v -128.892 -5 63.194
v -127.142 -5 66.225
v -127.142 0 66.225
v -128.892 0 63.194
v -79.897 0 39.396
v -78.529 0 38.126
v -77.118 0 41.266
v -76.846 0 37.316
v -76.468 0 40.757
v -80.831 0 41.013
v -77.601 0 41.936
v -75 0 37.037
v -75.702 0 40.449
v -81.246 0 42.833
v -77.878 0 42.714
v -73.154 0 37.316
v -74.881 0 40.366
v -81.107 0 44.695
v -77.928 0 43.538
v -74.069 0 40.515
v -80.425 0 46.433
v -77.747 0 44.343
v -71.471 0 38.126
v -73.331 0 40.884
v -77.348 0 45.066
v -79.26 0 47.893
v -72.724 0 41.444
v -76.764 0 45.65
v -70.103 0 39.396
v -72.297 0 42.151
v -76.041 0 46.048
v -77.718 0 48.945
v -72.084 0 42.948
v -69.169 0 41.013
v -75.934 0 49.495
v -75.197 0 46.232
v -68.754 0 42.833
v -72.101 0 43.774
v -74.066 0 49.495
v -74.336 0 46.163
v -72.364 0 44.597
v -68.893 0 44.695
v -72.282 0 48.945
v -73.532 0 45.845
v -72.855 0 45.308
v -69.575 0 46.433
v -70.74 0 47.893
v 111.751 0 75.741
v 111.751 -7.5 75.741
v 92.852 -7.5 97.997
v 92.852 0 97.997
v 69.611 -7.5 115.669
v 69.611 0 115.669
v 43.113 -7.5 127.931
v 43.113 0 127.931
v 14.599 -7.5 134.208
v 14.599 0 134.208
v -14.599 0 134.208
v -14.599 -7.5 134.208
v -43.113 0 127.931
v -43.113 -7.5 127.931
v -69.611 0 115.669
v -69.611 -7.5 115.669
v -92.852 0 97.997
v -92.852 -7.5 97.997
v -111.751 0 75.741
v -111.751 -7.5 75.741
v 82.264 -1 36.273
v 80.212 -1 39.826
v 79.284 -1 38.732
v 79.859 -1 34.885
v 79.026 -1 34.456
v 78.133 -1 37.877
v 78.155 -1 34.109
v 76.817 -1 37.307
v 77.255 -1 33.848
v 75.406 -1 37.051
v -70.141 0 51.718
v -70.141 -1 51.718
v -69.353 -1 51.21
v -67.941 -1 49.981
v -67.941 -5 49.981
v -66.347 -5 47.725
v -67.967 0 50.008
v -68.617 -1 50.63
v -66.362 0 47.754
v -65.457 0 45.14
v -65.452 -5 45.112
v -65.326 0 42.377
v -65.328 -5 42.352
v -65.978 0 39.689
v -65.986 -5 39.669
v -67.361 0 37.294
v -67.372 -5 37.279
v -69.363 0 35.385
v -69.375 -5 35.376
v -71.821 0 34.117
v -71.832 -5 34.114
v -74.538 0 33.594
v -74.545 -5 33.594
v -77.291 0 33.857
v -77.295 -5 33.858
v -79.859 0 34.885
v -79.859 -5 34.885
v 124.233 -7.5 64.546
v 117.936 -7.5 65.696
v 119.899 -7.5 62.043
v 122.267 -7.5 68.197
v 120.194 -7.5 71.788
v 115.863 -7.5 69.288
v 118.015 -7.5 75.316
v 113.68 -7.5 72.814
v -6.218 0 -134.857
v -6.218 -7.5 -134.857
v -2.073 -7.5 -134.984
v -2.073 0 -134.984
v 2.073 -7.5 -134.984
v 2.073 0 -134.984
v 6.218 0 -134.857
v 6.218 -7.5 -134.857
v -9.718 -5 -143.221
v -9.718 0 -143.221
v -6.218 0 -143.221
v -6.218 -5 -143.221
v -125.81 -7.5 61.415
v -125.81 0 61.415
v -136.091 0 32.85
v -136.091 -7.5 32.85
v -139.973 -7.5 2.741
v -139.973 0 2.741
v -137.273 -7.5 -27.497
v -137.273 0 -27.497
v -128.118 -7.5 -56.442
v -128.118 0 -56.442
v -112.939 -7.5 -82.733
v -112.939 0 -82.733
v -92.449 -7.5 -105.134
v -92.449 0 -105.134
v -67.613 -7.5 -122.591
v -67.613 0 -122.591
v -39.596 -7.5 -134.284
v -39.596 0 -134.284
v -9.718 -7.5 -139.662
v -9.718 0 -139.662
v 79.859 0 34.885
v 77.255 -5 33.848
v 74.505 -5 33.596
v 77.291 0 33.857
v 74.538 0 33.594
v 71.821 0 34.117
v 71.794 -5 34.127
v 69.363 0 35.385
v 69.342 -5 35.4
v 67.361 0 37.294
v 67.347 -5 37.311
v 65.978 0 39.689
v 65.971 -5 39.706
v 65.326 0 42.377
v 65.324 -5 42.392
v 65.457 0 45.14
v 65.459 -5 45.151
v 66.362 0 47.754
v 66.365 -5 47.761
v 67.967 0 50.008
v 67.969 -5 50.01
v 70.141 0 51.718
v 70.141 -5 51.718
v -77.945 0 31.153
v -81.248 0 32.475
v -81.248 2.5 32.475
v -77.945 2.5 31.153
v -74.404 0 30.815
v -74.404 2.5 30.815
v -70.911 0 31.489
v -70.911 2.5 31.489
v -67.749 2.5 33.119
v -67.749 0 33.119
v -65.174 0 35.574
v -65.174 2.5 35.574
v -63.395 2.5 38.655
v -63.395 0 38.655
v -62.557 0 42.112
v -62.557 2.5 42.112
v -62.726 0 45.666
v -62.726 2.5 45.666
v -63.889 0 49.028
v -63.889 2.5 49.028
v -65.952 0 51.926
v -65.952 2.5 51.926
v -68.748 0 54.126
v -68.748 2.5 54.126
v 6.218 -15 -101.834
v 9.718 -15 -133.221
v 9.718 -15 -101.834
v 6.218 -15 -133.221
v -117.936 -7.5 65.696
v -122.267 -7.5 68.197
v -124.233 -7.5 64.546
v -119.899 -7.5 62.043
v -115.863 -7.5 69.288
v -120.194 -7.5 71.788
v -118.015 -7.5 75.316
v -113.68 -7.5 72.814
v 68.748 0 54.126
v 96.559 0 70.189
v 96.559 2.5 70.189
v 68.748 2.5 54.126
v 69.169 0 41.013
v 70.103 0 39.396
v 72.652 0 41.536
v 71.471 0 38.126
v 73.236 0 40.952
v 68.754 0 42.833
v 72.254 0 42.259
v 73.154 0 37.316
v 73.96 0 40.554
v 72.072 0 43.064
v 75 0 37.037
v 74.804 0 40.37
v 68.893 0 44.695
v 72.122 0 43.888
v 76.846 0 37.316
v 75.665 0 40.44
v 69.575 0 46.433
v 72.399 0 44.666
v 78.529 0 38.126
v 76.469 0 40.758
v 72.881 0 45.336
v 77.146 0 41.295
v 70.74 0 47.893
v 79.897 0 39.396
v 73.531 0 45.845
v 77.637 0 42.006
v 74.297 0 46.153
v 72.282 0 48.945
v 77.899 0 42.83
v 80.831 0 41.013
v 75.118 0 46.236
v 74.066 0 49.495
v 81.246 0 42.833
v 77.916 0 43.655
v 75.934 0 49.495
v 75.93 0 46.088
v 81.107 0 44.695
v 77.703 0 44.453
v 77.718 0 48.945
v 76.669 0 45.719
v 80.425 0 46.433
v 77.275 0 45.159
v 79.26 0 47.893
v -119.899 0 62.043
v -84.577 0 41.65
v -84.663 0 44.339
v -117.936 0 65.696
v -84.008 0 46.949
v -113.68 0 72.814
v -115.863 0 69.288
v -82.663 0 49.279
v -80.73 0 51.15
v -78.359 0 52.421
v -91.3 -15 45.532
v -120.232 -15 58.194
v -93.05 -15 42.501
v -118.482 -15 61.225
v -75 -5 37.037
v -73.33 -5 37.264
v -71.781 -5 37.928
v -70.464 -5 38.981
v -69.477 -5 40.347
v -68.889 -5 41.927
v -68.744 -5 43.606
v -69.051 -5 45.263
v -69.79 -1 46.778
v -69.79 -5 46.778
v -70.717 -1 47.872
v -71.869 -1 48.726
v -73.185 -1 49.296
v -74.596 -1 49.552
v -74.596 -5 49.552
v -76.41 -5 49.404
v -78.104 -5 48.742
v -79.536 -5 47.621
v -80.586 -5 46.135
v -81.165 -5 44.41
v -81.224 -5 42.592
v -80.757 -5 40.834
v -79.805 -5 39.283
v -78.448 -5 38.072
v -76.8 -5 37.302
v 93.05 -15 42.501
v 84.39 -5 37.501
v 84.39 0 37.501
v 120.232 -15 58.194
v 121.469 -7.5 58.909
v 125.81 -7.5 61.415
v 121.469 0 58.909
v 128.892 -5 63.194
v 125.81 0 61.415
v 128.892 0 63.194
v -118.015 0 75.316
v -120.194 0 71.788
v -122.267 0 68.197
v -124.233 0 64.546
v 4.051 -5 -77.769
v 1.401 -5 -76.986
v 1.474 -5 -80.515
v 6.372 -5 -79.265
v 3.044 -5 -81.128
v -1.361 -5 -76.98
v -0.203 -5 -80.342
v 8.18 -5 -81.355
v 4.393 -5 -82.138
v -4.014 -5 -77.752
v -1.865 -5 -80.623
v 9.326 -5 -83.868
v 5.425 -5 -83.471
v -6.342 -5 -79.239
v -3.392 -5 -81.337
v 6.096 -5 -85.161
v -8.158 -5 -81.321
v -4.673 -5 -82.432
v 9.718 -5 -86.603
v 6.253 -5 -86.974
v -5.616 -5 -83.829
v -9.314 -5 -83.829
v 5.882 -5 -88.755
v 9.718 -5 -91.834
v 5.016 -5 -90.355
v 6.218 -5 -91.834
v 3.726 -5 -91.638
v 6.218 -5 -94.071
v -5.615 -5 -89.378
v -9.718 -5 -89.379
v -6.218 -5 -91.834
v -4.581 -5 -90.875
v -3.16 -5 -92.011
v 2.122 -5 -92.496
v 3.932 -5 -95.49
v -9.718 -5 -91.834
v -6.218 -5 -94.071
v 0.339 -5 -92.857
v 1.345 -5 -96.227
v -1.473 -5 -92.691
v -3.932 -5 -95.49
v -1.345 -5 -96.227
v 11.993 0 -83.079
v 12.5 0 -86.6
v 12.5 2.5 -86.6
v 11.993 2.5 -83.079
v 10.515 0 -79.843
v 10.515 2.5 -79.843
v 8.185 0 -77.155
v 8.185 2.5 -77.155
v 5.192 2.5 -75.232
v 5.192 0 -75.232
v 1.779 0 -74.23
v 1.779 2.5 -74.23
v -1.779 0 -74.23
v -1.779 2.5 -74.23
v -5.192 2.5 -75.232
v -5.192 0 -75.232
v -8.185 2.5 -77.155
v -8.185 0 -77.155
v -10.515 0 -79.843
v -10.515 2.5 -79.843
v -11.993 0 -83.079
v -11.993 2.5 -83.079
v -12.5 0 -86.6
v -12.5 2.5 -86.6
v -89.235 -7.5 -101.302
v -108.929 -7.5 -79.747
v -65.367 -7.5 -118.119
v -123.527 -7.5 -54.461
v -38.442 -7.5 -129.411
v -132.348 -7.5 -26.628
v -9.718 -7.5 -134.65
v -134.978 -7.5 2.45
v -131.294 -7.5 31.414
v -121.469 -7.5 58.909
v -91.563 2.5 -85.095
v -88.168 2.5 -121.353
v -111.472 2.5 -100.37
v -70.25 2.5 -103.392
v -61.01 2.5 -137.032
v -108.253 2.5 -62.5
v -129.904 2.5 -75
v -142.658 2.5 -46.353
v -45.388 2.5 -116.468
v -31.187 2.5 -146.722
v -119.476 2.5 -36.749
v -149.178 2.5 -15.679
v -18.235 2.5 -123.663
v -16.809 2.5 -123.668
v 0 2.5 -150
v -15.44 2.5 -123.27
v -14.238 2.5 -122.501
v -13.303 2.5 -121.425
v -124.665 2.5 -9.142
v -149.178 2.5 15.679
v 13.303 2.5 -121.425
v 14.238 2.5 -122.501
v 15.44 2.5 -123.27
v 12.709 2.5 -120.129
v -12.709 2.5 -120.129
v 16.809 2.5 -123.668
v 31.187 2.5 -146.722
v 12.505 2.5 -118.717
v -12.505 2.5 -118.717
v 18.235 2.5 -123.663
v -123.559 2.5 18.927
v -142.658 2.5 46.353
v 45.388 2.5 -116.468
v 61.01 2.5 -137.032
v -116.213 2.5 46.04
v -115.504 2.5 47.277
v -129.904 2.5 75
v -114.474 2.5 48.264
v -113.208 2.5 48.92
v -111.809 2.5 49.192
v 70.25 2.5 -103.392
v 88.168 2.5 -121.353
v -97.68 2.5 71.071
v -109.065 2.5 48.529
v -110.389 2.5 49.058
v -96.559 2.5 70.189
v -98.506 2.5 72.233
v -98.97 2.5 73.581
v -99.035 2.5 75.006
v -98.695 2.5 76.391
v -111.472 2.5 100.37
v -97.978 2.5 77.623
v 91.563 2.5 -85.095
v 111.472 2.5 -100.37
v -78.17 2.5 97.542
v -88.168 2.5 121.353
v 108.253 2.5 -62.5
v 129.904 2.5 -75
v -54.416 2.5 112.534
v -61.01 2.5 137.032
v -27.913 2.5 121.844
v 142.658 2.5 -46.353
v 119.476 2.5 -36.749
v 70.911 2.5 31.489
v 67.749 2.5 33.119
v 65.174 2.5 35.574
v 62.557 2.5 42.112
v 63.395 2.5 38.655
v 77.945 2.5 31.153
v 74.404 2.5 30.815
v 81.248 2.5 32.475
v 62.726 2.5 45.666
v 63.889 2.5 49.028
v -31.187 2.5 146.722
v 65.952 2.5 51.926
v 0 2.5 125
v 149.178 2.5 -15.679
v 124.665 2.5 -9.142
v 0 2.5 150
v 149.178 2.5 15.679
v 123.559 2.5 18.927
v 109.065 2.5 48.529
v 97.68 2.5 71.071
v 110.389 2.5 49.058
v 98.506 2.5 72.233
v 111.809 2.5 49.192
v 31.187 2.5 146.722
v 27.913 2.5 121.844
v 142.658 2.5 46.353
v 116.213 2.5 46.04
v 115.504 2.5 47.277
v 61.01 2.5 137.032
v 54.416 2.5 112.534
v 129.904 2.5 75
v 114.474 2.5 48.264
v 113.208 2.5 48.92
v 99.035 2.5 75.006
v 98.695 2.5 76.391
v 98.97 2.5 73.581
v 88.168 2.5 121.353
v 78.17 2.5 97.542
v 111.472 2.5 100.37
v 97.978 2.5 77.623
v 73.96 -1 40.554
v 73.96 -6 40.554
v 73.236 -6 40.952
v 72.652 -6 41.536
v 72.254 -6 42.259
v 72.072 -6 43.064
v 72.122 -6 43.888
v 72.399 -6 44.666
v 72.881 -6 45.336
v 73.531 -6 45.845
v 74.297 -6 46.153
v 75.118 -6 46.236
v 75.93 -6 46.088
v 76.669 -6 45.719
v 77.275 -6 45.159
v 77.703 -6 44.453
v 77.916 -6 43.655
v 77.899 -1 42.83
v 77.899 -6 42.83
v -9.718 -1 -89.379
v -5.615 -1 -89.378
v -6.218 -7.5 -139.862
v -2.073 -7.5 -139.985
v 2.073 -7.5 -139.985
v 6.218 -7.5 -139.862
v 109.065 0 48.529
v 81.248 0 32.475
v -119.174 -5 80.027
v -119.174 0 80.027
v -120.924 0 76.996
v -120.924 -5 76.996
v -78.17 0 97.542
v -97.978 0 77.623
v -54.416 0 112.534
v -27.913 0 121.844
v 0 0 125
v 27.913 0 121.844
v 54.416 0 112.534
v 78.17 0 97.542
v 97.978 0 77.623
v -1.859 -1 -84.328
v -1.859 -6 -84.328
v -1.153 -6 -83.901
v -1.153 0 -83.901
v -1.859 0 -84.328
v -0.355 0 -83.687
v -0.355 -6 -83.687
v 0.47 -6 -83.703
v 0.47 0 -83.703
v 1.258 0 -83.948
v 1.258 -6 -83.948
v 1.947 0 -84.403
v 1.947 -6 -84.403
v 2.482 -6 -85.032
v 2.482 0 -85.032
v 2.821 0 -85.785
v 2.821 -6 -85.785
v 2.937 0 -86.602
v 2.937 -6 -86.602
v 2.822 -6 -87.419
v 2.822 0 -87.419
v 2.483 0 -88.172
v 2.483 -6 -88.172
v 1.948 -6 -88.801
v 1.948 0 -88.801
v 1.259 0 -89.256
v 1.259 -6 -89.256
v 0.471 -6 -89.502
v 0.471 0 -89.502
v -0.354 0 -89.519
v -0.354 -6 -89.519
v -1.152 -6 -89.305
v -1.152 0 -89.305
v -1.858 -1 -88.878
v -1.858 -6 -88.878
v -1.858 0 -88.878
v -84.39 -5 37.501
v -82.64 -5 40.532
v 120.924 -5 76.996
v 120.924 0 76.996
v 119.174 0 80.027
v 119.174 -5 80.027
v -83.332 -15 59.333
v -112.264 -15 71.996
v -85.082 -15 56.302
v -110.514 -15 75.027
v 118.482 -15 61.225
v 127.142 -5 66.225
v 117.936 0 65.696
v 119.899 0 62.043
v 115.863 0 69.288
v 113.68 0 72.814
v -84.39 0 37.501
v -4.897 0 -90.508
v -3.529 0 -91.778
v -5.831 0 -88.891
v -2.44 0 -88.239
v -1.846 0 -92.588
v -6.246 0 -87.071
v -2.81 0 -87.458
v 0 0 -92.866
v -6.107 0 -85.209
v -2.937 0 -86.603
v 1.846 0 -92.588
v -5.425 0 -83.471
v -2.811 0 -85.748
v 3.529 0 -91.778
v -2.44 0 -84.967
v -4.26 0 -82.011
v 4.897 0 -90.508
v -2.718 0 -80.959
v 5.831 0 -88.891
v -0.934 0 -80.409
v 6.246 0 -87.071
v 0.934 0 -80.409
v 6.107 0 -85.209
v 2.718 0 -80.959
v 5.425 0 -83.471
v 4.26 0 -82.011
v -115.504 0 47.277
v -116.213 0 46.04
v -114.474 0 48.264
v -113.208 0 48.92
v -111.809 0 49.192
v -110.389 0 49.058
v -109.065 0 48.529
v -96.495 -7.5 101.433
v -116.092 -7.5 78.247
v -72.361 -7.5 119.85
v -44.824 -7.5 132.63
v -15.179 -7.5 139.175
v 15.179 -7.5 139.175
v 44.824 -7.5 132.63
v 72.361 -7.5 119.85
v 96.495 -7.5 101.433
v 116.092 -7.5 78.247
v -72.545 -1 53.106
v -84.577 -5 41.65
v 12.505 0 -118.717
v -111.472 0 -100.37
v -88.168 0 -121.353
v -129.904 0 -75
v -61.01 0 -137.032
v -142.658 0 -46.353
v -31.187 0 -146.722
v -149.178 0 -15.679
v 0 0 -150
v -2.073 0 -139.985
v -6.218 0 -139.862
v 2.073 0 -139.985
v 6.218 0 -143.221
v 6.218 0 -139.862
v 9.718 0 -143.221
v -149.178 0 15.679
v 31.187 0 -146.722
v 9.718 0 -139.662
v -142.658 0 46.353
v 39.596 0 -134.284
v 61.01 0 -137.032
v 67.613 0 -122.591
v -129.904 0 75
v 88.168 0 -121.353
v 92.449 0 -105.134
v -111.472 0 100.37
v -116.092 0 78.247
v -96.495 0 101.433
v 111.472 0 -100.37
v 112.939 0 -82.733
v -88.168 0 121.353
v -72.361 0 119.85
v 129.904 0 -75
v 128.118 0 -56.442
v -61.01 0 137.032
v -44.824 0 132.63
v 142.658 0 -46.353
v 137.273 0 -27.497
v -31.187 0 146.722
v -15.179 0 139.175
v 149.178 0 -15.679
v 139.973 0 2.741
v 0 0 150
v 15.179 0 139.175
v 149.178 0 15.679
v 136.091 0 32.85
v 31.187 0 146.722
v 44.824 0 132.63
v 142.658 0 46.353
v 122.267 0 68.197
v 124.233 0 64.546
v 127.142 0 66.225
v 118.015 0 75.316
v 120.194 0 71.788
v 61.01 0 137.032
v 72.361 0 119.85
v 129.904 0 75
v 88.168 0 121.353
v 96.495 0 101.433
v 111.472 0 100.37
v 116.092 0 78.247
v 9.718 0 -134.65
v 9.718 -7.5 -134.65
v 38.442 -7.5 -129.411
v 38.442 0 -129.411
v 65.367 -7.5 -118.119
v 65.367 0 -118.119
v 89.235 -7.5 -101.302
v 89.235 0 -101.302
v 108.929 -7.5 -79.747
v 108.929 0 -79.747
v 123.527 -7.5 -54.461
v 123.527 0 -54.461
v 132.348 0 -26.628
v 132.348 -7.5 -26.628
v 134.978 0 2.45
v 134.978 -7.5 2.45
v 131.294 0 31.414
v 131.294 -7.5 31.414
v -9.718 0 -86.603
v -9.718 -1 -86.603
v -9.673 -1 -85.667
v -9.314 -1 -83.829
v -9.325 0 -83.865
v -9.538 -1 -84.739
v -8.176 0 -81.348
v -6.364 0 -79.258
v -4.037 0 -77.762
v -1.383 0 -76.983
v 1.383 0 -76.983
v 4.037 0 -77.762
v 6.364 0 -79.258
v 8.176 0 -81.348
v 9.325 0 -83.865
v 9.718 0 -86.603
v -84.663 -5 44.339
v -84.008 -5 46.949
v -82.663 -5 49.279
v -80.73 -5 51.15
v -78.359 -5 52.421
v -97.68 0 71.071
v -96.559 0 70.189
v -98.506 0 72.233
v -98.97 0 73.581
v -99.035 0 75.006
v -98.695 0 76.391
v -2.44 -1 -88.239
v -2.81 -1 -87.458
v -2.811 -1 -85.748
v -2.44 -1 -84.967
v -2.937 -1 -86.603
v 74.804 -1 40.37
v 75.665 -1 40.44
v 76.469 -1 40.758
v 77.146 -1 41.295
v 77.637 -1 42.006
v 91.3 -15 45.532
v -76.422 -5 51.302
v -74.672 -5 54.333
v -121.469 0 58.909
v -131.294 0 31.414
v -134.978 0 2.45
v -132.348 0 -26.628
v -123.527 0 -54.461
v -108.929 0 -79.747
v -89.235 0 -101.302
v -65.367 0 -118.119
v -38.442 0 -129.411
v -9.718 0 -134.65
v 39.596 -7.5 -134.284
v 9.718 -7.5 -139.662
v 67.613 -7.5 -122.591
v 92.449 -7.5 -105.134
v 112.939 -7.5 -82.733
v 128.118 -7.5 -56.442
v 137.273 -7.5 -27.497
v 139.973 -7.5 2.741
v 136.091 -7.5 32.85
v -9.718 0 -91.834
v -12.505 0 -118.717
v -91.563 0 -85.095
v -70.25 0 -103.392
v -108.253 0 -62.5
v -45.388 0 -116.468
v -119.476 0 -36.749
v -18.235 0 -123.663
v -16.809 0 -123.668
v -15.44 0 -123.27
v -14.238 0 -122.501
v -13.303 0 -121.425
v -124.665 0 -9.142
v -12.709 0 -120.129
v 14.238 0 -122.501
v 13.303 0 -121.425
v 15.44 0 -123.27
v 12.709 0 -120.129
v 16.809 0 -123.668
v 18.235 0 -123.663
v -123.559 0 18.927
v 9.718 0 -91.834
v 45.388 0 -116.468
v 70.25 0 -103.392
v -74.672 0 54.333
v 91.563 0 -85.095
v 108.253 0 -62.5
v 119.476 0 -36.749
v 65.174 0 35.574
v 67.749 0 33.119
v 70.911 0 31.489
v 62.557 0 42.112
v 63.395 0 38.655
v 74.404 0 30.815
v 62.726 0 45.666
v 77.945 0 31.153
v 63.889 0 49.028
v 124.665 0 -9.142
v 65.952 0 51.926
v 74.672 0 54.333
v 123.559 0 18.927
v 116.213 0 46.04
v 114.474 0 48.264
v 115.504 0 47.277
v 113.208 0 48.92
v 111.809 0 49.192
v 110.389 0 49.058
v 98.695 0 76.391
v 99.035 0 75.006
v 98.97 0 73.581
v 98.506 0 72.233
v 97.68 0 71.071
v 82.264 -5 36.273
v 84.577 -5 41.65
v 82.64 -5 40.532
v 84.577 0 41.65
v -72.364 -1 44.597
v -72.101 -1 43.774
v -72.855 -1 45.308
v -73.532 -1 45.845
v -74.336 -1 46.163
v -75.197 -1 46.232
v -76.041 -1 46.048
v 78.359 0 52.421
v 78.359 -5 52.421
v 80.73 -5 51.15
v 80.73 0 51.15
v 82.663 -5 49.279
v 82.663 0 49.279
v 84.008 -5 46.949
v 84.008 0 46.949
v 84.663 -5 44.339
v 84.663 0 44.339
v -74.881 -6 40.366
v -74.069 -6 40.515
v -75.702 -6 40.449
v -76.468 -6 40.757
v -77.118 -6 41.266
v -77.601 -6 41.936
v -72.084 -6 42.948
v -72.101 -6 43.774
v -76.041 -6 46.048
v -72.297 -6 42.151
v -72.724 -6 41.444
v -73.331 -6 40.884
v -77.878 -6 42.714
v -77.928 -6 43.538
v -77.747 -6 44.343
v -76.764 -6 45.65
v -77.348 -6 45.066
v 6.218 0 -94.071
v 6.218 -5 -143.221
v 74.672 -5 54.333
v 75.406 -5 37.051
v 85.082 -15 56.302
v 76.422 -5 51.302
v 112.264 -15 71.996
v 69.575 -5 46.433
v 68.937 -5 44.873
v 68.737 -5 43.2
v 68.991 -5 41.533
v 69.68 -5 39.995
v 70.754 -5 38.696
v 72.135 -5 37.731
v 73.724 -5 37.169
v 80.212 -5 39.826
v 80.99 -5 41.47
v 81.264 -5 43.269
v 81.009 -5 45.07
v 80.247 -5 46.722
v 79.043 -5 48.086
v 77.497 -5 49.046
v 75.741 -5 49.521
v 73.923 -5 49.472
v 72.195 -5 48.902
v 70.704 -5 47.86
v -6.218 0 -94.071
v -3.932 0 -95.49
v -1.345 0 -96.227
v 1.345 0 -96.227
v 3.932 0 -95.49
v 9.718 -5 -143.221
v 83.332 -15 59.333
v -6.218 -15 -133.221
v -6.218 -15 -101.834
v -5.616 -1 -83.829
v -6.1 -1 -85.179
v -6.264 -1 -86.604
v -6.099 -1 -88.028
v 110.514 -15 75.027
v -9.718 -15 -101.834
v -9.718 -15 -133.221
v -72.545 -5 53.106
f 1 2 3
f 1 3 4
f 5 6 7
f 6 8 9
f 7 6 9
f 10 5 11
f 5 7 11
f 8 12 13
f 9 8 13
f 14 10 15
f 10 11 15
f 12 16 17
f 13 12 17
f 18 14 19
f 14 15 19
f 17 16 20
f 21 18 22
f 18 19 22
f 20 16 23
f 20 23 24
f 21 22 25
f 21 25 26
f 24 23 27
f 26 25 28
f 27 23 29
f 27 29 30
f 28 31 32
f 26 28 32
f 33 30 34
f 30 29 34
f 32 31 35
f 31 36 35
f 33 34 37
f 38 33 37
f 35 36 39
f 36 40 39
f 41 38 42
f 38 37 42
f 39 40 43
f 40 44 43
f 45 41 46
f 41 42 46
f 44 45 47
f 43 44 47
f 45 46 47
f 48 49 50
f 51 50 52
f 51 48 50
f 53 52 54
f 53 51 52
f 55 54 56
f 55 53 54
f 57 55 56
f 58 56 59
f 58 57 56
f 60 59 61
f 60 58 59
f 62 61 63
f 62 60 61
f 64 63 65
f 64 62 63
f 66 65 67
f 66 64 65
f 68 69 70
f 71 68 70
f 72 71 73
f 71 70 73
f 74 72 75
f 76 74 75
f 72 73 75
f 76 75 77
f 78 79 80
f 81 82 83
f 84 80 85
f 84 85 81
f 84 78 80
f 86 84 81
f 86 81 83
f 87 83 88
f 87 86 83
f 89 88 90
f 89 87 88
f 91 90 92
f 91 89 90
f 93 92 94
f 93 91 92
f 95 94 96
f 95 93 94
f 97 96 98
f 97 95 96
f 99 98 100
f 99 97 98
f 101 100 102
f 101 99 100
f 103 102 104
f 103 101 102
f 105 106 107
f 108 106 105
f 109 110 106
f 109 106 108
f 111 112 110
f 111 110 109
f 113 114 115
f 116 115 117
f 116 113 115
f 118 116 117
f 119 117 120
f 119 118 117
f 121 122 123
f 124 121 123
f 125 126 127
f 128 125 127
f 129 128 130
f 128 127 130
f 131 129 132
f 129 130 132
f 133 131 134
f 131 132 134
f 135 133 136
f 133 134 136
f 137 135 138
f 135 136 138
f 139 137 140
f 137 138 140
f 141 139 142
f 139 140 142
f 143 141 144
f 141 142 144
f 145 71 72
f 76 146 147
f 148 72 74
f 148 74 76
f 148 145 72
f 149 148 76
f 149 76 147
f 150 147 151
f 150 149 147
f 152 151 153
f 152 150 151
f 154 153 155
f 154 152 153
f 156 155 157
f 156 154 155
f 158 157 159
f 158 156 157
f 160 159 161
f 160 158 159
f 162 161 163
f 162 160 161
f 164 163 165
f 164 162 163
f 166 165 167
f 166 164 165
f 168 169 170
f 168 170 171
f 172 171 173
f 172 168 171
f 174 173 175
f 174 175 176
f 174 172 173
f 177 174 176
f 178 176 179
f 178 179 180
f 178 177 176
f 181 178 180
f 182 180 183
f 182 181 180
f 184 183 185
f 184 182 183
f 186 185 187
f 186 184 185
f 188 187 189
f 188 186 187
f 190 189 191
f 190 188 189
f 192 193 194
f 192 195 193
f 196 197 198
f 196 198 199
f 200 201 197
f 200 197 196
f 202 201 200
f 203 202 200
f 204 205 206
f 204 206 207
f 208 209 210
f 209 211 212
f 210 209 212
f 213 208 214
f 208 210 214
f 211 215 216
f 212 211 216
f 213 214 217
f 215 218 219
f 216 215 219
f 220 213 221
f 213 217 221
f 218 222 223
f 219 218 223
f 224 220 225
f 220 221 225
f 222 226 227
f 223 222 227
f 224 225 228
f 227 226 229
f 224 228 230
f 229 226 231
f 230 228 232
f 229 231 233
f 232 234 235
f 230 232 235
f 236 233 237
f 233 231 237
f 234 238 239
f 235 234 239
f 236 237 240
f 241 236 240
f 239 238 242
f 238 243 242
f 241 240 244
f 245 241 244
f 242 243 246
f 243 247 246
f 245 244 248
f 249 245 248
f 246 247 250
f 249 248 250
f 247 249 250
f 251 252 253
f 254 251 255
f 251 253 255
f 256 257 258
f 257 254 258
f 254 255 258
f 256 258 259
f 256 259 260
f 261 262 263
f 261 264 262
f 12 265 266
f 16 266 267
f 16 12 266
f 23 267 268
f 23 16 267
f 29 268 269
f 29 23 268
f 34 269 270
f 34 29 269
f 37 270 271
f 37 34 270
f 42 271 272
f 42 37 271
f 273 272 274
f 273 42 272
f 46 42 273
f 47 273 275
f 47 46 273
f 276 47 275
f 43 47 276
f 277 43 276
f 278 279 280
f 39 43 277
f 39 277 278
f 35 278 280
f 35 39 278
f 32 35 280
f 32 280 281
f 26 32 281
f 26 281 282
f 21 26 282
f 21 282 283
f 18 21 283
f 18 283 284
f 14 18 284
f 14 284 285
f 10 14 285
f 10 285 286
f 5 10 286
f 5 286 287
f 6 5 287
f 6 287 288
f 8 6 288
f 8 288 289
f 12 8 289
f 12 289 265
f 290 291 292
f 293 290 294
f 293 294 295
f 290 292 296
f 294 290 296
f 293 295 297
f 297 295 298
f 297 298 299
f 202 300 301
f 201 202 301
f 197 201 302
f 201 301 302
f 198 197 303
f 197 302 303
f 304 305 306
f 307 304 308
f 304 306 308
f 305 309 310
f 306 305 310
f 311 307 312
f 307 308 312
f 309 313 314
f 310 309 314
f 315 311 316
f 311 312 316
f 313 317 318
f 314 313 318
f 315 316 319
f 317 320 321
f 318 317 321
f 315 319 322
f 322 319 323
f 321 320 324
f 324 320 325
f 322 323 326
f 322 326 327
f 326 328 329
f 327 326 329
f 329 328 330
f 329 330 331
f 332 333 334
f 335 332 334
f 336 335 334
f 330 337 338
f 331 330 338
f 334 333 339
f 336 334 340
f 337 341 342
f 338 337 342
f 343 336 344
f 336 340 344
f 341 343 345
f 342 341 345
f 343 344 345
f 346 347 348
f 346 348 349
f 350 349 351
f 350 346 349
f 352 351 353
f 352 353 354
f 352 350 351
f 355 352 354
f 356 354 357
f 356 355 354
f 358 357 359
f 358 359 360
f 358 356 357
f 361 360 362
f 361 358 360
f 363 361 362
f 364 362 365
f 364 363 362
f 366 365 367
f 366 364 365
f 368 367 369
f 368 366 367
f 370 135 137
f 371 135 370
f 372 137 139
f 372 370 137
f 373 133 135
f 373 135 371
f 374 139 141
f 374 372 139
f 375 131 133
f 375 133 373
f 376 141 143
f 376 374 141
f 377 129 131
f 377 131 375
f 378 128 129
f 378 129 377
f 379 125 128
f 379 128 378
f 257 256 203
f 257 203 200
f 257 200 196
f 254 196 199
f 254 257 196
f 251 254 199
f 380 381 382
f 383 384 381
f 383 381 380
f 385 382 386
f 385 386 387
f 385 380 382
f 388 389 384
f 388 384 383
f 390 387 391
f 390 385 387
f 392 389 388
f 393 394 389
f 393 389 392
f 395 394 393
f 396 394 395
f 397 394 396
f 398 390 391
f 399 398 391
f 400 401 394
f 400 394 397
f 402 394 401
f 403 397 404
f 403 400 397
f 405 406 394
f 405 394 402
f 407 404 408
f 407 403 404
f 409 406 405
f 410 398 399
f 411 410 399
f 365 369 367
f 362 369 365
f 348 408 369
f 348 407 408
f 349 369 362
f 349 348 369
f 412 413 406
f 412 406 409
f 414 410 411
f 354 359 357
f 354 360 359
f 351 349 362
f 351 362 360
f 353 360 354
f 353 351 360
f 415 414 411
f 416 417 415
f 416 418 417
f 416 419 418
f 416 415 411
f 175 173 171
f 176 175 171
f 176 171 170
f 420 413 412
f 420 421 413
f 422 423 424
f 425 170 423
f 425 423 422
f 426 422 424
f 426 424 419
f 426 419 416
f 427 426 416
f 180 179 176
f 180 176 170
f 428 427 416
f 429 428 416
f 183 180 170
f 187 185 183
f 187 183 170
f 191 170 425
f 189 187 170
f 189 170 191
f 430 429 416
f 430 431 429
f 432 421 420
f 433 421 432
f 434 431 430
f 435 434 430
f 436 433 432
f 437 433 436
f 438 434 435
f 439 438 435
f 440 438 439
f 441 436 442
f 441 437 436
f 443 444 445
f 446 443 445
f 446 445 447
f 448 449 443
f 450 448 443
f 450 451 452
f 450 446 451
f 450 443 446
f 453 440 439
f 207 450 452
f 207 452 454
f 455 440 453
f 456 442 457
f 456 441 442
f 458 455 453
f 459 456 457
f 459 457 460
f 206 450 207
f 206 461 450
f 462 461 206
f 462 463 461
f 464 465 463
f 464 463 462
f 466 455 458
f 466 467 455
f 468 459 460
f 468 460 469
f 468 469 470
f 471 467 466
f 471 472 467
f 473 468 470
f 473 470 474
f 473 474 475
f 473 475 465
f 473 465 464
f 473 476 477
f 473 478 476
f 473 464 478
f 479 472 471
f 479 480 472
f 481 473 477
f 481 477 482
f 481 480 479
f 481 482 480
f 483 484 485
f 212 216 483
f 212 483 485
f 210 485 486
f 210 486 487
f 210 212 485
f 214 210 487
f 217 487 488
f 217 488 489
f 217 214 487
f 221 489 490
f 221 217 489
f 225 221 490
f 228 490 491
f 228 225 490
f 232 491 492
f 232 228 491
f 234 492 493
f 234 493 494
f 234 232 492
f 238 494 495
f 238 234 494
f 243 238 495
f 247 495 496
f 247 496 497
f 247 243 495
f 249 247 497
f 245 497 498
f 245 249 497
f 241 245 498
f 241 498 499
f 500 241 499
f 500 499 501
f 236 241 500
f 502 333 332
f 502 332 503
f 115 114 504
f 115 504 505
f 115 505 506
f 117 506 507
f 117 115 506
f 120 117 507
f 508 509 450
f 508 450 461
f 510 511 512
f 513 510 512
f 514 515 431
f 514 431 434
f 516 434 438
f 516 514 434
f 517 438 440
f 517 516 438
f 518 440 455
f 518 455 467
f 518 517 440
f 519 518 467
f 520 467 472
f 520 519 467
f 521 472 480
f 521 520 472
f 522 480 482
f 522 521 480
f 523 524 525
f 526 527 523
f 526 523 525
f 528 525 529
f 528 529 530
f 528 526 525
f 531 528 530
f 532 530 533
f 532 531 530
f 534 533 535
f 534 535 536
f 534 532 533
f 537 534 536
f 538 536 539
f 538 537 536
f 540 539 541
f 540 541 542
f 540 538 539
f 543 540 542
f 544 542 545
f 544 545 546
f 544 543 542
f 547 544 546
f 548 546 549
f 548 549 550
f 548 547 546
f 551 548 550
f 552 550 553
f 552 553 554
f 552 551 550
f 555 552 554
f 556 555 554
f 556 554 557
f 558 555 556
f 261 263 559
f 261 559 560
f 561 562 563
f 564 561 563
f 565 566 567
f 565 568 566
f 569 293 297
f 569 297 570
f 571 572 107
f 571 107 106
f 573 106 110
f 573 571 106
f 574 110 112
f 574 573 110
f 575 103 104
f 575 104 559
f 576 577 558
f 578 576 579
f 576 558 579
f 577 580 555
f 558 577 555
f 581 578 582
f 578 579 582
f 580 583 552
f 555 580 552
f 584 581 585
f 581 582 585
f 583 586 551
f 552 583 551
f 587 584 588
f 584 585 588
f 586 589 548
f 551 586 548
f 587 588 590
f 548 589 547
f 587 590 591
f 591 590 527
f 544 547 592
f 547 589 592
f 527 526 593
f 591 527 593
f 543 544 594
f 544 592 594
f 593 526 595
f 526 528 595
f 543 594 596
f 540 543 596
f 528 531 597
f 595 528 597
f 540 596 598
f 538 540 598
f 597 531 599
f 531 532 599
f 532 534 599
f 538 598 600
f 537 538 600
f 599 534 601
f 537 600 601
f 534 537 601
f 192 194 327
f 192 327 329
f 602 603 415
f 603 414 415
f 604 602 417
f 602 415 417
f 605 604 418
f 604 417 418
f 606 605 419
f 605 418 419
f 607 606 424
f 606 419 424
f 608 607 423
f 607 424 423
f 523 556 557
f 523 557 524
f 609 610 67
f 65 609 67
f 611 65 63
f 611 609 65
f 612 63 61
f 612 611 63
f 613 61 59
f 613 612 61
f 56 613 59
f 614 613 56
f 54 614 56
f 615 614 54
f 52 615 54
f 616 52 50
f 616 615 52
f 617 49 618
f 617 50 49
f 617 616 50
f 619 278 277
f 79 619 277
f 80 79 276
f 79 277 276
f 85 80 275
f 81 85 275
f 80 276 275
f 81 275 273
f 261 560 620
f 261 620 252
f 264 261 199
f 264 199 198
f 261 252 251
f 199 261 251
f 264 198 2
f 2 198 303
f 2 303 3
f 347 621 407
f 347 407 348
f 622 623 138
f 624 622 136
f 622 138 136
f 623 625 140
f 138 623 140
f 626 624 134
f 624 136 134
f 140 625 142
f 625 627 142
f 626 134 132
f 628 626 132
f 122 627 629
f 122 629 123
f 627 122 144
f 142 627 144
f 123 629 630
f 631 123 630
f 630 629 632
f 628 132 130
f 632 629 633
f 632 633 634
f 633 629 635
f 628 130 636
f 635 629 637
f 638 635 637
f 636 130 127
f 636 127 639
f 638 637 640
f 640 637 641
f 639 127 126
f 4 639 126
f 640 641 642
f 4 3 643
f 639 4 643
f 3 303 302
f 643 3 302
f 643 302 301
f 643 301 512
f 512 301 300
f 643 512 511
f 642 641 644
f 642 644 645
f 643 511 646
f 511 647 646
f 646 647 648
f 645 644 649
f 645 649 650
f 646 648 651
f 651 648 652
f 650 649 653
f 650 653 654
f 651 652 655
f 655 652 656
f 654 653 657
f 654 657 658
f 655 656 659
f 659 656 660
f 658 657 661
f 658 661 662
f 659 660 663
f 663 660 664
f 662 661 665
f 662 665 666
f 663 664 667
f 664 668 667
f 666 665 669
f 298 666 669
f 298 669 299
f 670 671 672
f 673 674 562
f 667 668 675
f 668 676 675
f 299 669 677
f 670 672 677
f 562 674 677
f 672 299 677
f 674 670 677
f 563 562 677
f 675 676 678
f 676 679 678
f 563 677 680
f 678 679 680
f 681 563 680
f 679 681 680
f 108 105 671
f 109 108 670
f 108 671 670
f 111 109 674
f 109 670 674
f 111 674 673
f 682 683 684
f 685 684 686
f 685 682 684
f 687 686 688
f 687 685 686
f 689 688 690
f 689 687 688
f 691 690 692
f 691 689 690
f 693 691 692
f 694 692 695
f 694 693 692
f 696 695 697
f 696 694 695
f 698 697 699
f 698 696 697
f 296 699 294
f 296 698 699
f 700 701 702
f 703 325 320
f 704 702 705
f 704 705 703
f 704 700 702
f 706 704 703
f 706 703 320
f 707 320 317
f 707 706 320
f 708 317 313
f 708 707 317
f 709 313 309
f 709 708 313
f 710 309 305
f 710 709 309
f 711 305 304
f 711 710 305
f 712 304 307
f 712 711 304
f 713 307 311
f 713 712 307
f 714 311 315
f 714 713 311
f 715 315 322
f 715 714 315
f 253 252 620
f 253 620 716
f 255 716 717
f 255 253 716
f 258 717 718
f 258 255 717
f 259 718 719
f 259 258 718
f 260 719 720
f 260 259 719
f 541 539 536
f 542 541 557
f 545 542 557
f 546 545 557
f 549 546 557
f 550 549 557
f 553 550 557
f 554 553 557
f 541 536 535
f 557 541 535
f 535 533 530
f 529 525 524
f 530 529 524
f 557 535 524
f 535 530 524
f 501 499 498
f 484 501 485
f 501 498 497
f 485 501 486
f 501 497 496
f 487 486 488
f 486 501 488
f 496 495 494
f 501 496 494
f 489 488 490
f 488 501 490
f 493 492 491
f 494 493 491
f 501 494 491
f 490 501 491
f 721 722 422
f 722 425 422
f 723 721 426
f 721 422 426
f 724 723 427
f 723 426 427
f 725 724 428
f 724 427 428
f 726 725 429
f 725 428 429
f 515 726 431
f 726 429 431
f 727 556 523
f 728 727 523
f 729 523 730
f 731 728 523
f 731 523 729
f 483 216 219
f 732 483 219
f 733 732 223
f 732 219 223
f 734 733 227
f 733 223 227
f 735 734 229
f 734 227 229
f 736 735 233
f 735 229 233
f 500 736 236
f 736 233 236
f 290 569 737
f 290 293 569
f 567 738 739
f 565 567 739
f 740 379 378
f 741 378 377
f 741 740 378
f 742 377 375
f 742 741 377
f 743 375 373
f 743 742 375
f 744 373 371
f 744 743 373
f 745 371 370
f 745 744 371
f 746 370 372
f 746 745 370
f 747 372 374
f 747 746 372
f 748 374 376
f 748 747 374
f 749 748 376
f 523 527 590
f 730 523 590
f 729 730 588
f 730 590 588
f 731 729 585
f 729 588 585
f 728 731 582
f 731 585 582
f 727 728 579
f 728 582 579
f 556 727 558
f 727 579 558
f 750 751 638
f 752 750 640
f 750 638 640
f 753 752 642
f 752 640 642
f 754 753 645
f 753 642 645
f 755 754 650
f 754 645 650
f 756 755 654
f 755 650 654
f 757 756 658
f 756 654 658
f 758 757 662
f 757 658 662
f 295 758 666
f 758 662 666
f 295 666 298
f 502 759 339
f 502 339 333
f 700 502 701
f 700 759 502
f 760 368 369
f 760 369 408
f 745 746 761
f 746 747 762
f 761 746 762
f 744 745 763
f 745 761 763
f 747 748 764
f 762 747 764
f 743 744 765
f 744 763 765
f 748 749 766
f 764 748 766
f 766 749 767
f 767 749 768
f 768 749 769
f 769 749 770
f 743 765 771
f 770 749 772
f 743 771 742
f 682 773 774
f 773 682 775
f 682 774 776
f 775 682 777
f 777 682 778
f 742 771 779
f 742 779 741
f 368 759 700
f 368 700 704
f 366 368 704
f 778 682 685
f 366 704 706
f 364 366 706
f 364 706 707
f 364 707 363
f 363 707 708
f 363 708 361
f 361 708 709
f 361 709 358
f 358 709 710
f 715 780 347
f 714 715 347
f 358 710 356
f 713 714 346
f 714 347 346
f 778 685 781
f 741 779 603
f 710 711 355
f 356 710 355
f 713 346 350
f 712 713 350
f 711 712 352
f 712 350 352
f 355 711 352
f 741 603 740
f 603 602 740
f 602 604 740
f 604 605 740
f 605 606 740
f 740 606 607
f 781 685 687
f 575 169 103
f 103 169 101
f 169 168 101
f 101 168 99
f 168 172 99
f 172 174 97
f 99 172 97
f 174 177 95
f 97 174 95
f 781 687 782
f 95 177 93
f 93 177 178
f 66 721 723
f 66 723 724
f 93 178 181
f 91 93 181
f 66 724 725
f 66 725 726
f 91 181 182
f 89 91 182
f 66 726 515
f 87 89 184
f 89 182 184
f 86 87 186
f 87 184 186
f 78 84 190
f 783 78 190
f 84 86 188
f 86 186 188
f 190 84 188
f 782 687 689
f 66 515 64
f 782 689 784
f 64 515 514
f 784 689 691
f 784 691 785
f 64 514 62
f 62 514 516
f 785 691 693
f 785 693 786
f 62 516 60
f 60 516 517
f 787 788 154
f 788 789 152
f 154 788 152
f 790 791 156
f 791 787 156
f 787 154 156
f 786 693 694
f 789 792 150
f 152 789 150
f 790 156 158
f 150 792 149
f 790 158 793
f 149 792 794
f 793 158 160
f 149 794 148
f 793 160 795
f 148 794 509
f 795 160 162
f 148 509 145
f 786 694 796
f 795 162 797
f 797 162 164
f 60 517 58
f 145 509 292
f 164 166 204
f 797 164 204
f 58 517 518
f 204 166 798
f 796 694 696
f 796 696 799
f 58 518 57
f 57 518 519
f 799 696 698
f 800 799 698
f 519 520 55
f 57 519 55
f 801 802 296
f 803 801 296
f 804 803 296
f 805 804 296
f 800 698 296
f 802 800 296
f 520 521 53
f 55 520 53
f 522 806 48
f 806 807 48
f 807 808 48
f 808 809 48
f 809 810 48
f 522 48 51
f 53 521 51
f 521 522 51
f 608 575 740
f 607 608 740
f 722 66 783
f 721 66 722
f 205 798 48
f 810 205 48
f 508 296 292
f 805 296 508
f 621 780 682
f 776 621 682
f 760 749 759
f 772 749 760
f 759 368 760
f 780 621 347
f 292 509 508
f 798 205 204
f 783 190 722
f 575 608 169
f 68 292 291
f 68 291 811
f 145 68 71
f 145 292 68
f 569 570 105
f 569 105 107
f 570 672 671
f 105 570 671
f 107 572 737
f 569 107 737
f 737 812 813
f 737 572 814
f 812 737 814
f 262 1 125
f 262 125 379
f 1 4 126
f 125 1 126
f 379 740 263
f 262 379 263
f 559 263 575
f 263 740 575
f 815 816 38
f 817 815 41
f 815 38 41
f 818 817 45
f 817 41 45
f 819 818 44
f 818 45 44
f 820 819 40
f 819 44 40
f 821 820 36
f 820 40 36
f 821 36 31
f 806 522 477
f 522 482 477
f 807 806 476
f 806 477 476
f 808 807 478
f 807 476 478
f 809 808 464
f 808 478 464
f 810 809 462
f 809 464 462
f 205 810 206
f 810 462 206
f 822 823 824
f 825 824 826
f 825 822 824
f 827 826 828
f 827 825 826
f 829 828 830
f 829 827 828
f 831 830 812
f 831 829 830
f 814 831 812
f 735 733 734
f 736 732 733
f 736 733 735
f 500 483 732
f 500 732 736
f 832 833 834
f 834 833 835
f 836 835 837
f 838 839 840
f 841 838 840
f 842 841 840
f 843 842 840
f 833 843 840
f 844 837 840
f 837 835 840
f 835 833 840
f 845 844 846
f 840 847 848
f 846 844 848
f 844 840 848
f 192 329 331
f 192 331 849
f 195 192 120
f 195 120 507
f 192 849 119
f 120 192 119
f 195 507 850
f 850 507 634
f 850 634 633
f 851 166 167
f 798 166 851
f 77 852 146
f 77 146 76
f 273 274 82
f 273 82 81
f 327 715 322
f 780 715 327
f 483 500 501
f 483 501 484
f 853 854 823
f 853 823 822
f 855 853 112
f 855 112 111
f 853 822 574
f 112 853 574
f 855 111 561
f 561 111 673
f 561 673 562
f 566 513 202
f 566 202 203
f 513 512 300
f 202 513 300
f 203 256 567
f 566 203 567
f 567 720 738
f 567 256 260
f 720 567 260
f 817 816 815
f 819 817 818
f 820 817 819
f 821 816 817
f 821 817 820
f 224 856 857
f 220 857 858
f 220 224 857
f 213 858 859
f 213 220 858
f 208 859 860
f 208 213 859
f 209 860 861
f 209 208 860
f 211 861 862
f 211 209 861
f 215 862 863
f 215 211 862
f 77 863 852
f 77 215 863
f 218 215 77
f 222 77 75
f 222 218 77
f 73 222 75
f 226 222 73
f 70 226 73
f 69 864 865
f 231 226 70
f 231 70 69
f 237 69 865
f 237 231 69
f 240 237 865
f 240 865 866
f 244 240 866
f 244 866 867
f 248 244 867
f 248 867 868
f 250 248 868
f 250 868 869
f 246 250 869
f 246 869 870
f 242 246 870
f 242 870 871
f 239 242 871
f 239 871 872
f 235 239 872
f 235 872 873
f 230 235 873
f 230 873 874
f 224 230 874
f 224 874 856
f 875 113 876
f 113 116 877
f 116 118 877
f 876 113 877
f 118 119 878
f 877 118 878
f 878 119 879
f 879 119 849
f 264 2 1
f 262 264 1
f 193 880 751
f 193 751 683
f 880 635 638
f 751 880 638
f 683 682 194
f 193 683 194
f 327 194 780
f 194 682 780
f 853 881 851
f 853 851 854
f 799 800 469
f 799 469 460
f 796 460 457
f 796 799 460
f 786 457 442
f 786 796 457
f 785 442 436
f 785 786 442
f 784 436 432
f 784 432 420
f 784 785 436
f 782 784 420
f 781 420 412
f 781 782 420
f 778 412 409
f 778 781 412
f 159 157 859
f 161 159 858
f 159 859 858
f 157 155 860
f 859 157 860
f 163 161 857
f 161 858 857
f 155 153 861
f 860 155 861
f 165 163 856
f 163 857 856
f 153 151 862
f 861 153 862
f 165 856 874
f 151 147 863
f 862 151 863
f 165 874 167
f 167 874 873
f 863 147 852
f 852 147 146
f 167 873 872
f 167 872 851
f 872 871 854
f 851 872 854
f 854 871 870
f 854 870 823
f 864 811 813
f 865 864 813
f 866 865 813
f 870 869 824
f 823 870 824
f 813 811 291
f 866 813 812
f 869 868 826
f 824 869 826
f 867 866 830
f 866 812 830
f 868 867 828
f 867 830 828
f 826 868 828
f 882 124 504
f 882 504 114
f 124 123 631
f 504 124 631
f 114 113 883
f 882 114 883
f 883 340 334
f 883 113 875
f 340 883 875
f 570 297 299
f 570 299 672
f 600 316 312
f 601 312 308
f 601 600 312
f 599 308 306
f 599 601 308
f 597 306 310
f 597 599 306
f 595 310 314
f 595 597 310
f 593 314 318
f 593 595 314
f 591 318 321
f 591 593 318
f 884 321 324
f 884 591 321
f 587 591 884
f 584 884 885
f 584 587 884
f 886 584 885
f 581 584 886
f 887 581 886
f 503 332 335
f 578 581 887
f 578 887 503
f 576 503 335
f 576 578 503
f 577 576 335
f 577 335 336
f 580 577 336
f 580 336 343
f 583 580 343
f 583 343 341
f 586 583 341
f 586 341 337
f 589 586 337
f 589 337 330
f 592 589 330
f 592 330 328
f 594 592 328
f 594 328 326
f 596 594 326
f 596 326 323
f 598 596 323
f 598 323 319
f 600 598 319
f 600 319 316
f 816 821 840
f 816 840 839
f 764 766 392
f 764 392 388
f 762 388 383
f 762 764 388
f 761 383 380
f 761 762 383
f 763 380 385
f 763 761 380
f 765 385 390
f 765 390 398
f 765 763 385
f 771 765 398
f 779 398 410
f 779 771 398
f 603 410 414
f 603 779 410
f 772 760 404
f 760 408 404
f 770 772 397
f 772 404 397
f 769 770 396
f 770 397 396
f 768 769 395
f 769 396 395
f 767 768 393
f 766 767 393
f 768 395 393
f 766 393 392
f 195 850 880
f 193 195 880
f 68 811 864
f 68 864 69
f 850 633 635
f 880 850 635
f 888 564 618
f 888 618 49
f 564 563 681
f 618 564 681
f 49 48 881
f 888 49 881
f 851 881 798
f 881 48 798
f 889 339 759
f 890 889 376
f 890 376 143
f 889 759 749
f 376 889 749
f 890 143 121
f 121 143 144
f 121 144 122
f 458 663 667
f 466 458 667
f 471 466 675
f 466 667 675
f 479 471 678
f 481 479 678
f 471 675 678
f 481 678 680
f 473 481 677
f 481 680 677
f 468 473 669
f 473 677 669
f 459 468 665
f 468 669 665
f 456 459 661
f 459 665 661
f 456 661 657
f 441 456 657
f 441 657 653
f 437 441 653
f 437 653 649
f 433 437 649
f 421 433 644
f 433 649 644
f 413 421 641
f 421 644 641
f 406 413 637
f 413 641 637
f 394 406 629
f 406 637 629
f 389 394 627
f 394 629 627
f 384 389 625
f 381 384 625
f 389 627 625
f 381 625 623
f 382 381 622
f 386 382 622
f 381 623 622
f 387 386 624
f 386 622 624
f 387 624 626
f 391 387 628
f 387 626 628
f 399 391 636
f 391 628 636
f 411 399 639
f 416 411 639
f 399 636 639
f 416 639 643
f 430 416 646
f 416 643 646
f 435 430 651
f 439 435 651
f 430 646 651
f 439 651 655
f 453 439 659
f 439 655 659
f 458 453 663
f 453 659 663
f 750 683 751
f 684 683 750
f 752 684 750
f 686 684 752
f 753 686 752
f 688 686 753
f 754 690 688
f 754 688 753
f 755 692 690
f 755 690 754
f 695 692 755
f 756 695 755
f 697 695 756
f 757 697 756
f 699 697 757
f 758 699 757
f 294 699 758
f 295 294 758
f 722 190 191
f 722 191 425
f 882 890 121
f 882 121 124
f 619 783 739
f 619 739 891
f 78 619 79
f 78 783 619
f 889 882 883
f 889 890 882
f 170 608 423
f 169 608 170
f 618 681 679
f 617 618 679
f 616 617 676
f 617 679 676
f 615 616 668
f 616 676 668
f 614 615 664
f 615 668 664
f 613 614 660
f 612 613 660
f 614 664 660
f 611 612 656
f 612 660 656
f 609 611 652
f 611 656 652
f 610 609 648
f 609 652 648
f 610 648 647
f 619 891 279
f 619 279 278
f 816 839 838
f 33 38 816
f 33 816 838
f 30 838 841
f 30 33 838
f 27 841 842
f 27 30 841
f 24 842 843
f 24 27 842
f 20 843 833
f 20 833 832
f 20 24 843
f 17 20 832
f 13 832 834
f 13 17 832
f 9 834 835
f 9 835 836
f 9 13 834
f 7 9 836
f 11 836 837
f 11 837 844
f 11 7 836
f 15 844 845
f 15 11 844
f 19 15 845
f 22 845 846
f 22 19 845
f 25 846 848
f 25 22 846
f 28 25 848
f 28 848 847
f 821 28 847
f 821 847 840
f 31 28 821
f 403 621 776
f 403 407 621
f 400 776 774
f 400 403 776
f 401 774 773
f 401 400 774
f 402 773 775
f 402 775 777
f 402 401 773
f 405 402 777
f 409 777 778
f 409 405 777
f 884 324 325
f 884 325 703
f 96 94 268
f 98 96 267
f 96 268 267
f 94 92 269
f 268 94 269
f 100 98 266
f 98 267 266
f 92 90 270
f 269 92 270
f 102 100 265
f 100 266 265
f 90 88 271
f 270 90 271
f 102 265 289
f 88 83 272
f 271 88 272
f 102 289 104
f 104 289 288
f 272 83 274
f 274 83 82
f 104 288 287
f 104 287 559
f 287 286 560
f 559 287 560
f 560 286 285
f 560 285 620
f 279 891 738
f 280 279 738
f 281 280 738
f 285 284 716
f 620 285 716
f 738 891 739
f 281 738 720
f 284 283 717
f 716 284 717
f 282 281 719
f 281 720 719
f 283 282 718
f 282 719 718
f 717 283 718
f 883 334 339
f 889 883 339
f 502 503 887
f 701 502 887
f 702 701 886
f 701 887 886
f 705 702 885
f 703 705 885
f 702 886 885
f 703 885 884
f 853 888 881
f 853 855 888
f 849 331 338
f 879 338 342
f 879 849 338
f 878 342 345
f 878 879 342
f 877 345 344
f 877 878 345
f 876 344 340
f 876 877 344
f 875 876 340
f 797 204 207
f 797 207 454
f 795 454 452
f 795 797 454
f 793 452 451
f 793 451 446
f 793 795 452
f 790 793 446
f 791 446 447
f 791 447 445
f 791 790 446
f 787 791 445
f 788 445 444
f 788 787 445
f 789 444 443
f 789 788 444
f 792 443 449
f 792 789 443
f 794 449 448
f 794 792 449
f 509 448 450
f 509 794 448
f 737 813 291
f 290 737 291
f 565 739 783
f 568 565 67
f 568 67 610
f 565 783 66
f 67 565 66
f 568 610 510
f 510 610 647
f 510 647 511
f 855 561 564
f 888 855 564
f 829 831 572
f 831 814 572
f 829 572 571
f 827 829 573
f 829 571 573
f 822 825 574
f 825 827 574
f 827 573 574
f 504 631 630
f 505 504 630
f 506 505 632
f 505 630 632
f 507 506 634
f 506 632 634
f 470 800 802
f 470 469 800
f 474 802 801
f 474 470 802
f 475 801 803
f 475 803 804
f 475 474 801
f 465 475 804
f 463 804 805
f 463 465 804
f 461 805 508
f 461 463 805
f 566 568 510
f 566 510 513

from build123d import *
from build123d.topology import SkipClean

# Parameters (mm, degrees)
SKETCH1_R                    = 150
BOSS_EXTRUDE1_DEPTH          = 2.5
BOSS_EXTRUDE2_DEPTH          = 6
SKETCH3_R                    = 2.9375
BOSS_EXTRUDE3_DEPTH          = 1
BOSS_EXTRUDE4_DEPTH          = 15
CHAMFER1_SIZE                = 10
SKETCH5_R                    = 140
SKETCH5_R_2                  = 135
BOSS_EXTRUDE5_DEPTH          = 7.5
CIRPATTERN1_COUNT            = 3
CHAMFER1_OF_CIRPATTERN1_SIZE = 10
SKETCH6_R                    = 6.263847164
BOSS_EXTRUDE6_DEPTH          = 5
CUT_EXTRUDE2_REACH           = 216.467
SKETCH7_W                    = 5.549678092
SKETCH7_H                    = 5.5
CIRPATTERN2_COUNT            = 3
FILLET1_R                    = 5


with BuildPart() as part:
    # Sketch1 → Boss-Extrude1 (new body)
    with BuildSketch(Plane(origin=(0, 0, 0), x_dir=(1, 0, 0), z_dir=(0, 1, 0))):
        with Locations(Location((0, 0, 0), (0, 0, 270))):
            Circle(SKETCH1_R)
        with BuildLine():
            Line((-12.499999821, 86.600423276), (-12.506397258, 124.372786524))
            ThreePointArc((-12.506397258, 124.372786524), (-108.253175473, 62.5), (-113.963191298, -51.355535527))
            Line((-113.963191298, -51.355535527), (-81.248166446, -32.474894246))
            ThreePointArc((-81.248166446, -32.474894246), (-64.174682453, -37.051270189), (-68.748166625, -54.12552903))
            Line((-68.748166625, -54.12552903), (-101.45679404, -73.017250997))
            ThreePointArc((-101.45679404, -73.017250997), (0, -125), (101.45679404, -73.017250997))
            Line((101.45679404, -73.017250997), (68.748166625, -54.12552903))
            ThreePointArc((68.748166625, -54.12552903), (64.174682453, -37.051270189), (81.248166446, -32.474894246))
            Line((81.248166446, -32.474894246), (113.963191298, -51.355535527))
            ThreePointArc((113.963191298, -51.355535527), (108.253175473, 62.5), (12.506397258, 124.372786524))
            Line((12.506397258, 124.372786524), (12.499999821, 86.600423276))
            ThreePointArc((12.499999821, 86.600423276), (0, 74.102540378), (-12.499999821, 86.600423276))
        make_face(mode=Mode.SUBTRACT)
    extrude(amount=BOSS_EXTRUDE1_DEPTH)

    # Sketch2 → Boss-Extrude2 (add)
    with BuildSketch(Plane.XZ):
        with BuildLine():
            Line((-76.041284798, 46.048019581), (-72.100762763, 43.773847901))
            ThreePointArc((-72.100762763, 43.773847901), (-76.468319115, 40.757071843), (-76.041284798, 46.048019581))
        make_face()
        with BuildLine():
            Line((77.89939715, 42.829674582), (73.959645685, 40.554168234))
            ThreePointArc((73.959645685, 40.554168234), (73.530819157, 45.844971017), (77.89939715, 42.829674582))
        make_face()
        with BuildLine():
            Line((-1.858112352, -88.877694162), (-1.858882922, -84.328016136))
            ThreePointArc((-1.858882922, -84.328016136), (2.937499958, -86.602042859), (-1.858112352, -88.877694162))
        make_face()
    extrude(amount=BOSS_EXTRUDE2_DEPTH)

    # Sketch3 → Boss-Extrude3 (add)
    with SkipClean():  # the faces are left unmerged after this step: merging them gives an invalid solid
        with BuildSketch(Plane.XZ):
            with Locations(Location((-75, 43.301270189, 0), (0, 0, 110.761573949))):
                Circle(SKETCH3_R)
            with Locations(Location((75, 43.301270189, 0), (0, 0, 350.761573949))):
                Circle(SKETCH3_R)
            with Locations(Location((0, -86.602540378, 0), (0, 0, 129.257834216))):
                Circle(SKETCH3_R)
        extrude(amount=BOSS_EXTRUDE3_DEPTH)

    # Sketch4 → Boss-Extrude4 (add)
    with SkipClean():  # the faces are left unmerged after this step: merging them gives an invalid solid
        with BuildSketch(Plane.XZ):
            Polygon((-128.89230729, 63.194244449), (-84.389895617, 37.50076509), (-82.639895617, 40.531854003), (-127.14230729, 66.225333363), align=None)
            Polygon((-120.923974711, 76.995801328), (-76.421563038, 51.302321968), (-74.671563038, 54.333410882), (-119.173974711, 80.026890241), align=None)
        boss_extrude4 = extrude(amount=BOSS_EXTRUDE4_DEPTH)

    # Chamfer1
    chamfer1_edges = [part.edges().sort_by_distance(p)[0] for p in [
        (-128.01730729, -15, 64.709788906),
        (-83.514895617, -15, 39.016309547),
        (-120.048974711, -15, 78.511345784),
        (-75.546563038, -15, 52.817866425),
    ]]
    chamfer(chamfer1_edges, length=CHAMFER1_SIZE)

    # Sketch5 → Boss-Extrude5 (add)
    with SkipClean():  # the faces are left unmerged after this step: merging them gives an invalid solid
        with BuildSketch(Plane.XZ):
            Circle(SKETCH5_R)
            Circle(SKETCH5_R_2, mode=Mode.SUBTRACT)
        extrude(amount=BOSS_EXTRUDE5_DEPTH)

    # CirPattern1: Boss-Extrude4 ×3 about axis
    with SkipClean():  # the faces are left unmerged after this step: merging them gives an invalid solid
        cirpattern1_axis = Axis((0, 0, 0), (0, 1, 0))
        for i in range(1, CIRPATTERN1_COUNT):
            add(boss_extrude4.rotate(cirpattern1_axis, i * 360 / CIRPATTERN1_COUNT))

    # Chamfer1 of CirPattern1
    chamfer1_of_cirpattern1_edges = [part.edges().sort_by_distance(p)[0] for p in [
        (120.048974711, -15, 78.511345784),
        (75.546563038, -15, 52.817866425),
        (128.01730729, -15, 64.709788906),
        (83.514895617, -15, 39.016309547),
        (7.968332579, -15, -143.22113469),
        (7.968332579, -15, -91.834175972),
        (-7.968332579, -15, -143.22113469),
        (-7.968332579, -15, -91.834175972),
    ]]
    chamfer(chamfer1_of_cirpattern1_edges, length=CHAMFER1_OF_CIRPATTERN1_SIZE)

    # Sketch6 → Boss-Extrude6 (add)
    with SkipClean():  # the faces are left unmerged after this step: merging them gives an invalid solid
        with BuildSketch(Plane.XZ):
            with BuildLine():
                Line((-74.671563038, 54.333410882), (-70.140833711, 51.717593085))
                ThreePointArc((-70.140833711, 51.717593085), (-66.583677104, 38.4421039), (-79.859166289, 34.884947293))
                Line((-79.859166289, 34.884947293), (-84.389895617, 37.50076509))
                Line((-84.389895617, 37.50076509), (-83.625725577, 38.824346425))
                ThreePointArc((-83.625725577, 38.824346425), (-83.416322896, 48.160436479), (-75.435733078, 53.009829547))
                Line((-75.435733078, 53.009829547), (-74.671563038, 54.333410882))
            make_face()
            with Locations(Location((-75, 43.301270189, 0), (0, 0, 270))):
                Circle(SKETCH6_R, mode=Mode.SUBTRACT)
        boss_extrude6 = extrude(amount=BOSS_EXTRUDE6_DEPTH)

    # Sketch7 → Cut-Extrude2 (cut, up to next)
    with BuildSketch(Plane(origin=(0.936307925, 0, 1.622367408), x_dir=(0.8661100754576421, 0, -0.4998533156744661), z_dir=(0.4998533156744661, 0, 0.8661100754576421)), mode=Mode.PRIVATE) as cut_extrude2_sk1:
        with Locations((-86.602539136, -3.75)):
            Rectangle(SKETCH7_W, SKETCH7_H)
    cut_extrude2_tool1 = extrude(cut_extrude2_sk1.sketch, amount=CUT_EXTRUDE2_REACH, mode=Mode.PRIVATE) & part.part
    cut_extrude2 = cut_extrude2_tool1.solids().sort_by_distance((-74.071024, -3.75, 44.910934))[0]
    add(cut_extrude2, mode=Mode.SUBTRACT)

    # CirPattern2: Boss-Extrude6, Cut-Extrude2 ×3 about axis
    with SkipClean():  # the faces are left unmerged after this step: merging them gives an invalid solid
        cirpattern2_axis = Axis((0, 0, 0), (0, 1, 0))
        add([boss_extrude6.rotate(cirpattern2_axis, i * 360 / CIRPATTERN2_COUNT) for i in range(1, CIRPATTERN2_COUNT)])
        add([cut_extrude2.rotate(cirpattern2_axis, i * 360 / CIRPATTERN2_COUNT) for i in range(1, CIRPATTERN2_COUNT)], mode=Mode.SUBTRACT)

    # Fillet1
    fillet1_edges = [part.edges().sort_by_distance(p)[0] for p in [
        (-12.506397258, 1.25, -124.372786524),
        (-113.963191298, 1.25, 51.355535527),
        (-101.45679404, 1.25, 73.017250997),
        (101.45679404, 1.25, 73.017250997),
        (113.963191298, 1.25, 51.355535527),
        (12.506397258, 1.25, -124.372786524),
    ]]
    fillet(fillet1_edges, radius=FILLET1_R)


solid = part.part
